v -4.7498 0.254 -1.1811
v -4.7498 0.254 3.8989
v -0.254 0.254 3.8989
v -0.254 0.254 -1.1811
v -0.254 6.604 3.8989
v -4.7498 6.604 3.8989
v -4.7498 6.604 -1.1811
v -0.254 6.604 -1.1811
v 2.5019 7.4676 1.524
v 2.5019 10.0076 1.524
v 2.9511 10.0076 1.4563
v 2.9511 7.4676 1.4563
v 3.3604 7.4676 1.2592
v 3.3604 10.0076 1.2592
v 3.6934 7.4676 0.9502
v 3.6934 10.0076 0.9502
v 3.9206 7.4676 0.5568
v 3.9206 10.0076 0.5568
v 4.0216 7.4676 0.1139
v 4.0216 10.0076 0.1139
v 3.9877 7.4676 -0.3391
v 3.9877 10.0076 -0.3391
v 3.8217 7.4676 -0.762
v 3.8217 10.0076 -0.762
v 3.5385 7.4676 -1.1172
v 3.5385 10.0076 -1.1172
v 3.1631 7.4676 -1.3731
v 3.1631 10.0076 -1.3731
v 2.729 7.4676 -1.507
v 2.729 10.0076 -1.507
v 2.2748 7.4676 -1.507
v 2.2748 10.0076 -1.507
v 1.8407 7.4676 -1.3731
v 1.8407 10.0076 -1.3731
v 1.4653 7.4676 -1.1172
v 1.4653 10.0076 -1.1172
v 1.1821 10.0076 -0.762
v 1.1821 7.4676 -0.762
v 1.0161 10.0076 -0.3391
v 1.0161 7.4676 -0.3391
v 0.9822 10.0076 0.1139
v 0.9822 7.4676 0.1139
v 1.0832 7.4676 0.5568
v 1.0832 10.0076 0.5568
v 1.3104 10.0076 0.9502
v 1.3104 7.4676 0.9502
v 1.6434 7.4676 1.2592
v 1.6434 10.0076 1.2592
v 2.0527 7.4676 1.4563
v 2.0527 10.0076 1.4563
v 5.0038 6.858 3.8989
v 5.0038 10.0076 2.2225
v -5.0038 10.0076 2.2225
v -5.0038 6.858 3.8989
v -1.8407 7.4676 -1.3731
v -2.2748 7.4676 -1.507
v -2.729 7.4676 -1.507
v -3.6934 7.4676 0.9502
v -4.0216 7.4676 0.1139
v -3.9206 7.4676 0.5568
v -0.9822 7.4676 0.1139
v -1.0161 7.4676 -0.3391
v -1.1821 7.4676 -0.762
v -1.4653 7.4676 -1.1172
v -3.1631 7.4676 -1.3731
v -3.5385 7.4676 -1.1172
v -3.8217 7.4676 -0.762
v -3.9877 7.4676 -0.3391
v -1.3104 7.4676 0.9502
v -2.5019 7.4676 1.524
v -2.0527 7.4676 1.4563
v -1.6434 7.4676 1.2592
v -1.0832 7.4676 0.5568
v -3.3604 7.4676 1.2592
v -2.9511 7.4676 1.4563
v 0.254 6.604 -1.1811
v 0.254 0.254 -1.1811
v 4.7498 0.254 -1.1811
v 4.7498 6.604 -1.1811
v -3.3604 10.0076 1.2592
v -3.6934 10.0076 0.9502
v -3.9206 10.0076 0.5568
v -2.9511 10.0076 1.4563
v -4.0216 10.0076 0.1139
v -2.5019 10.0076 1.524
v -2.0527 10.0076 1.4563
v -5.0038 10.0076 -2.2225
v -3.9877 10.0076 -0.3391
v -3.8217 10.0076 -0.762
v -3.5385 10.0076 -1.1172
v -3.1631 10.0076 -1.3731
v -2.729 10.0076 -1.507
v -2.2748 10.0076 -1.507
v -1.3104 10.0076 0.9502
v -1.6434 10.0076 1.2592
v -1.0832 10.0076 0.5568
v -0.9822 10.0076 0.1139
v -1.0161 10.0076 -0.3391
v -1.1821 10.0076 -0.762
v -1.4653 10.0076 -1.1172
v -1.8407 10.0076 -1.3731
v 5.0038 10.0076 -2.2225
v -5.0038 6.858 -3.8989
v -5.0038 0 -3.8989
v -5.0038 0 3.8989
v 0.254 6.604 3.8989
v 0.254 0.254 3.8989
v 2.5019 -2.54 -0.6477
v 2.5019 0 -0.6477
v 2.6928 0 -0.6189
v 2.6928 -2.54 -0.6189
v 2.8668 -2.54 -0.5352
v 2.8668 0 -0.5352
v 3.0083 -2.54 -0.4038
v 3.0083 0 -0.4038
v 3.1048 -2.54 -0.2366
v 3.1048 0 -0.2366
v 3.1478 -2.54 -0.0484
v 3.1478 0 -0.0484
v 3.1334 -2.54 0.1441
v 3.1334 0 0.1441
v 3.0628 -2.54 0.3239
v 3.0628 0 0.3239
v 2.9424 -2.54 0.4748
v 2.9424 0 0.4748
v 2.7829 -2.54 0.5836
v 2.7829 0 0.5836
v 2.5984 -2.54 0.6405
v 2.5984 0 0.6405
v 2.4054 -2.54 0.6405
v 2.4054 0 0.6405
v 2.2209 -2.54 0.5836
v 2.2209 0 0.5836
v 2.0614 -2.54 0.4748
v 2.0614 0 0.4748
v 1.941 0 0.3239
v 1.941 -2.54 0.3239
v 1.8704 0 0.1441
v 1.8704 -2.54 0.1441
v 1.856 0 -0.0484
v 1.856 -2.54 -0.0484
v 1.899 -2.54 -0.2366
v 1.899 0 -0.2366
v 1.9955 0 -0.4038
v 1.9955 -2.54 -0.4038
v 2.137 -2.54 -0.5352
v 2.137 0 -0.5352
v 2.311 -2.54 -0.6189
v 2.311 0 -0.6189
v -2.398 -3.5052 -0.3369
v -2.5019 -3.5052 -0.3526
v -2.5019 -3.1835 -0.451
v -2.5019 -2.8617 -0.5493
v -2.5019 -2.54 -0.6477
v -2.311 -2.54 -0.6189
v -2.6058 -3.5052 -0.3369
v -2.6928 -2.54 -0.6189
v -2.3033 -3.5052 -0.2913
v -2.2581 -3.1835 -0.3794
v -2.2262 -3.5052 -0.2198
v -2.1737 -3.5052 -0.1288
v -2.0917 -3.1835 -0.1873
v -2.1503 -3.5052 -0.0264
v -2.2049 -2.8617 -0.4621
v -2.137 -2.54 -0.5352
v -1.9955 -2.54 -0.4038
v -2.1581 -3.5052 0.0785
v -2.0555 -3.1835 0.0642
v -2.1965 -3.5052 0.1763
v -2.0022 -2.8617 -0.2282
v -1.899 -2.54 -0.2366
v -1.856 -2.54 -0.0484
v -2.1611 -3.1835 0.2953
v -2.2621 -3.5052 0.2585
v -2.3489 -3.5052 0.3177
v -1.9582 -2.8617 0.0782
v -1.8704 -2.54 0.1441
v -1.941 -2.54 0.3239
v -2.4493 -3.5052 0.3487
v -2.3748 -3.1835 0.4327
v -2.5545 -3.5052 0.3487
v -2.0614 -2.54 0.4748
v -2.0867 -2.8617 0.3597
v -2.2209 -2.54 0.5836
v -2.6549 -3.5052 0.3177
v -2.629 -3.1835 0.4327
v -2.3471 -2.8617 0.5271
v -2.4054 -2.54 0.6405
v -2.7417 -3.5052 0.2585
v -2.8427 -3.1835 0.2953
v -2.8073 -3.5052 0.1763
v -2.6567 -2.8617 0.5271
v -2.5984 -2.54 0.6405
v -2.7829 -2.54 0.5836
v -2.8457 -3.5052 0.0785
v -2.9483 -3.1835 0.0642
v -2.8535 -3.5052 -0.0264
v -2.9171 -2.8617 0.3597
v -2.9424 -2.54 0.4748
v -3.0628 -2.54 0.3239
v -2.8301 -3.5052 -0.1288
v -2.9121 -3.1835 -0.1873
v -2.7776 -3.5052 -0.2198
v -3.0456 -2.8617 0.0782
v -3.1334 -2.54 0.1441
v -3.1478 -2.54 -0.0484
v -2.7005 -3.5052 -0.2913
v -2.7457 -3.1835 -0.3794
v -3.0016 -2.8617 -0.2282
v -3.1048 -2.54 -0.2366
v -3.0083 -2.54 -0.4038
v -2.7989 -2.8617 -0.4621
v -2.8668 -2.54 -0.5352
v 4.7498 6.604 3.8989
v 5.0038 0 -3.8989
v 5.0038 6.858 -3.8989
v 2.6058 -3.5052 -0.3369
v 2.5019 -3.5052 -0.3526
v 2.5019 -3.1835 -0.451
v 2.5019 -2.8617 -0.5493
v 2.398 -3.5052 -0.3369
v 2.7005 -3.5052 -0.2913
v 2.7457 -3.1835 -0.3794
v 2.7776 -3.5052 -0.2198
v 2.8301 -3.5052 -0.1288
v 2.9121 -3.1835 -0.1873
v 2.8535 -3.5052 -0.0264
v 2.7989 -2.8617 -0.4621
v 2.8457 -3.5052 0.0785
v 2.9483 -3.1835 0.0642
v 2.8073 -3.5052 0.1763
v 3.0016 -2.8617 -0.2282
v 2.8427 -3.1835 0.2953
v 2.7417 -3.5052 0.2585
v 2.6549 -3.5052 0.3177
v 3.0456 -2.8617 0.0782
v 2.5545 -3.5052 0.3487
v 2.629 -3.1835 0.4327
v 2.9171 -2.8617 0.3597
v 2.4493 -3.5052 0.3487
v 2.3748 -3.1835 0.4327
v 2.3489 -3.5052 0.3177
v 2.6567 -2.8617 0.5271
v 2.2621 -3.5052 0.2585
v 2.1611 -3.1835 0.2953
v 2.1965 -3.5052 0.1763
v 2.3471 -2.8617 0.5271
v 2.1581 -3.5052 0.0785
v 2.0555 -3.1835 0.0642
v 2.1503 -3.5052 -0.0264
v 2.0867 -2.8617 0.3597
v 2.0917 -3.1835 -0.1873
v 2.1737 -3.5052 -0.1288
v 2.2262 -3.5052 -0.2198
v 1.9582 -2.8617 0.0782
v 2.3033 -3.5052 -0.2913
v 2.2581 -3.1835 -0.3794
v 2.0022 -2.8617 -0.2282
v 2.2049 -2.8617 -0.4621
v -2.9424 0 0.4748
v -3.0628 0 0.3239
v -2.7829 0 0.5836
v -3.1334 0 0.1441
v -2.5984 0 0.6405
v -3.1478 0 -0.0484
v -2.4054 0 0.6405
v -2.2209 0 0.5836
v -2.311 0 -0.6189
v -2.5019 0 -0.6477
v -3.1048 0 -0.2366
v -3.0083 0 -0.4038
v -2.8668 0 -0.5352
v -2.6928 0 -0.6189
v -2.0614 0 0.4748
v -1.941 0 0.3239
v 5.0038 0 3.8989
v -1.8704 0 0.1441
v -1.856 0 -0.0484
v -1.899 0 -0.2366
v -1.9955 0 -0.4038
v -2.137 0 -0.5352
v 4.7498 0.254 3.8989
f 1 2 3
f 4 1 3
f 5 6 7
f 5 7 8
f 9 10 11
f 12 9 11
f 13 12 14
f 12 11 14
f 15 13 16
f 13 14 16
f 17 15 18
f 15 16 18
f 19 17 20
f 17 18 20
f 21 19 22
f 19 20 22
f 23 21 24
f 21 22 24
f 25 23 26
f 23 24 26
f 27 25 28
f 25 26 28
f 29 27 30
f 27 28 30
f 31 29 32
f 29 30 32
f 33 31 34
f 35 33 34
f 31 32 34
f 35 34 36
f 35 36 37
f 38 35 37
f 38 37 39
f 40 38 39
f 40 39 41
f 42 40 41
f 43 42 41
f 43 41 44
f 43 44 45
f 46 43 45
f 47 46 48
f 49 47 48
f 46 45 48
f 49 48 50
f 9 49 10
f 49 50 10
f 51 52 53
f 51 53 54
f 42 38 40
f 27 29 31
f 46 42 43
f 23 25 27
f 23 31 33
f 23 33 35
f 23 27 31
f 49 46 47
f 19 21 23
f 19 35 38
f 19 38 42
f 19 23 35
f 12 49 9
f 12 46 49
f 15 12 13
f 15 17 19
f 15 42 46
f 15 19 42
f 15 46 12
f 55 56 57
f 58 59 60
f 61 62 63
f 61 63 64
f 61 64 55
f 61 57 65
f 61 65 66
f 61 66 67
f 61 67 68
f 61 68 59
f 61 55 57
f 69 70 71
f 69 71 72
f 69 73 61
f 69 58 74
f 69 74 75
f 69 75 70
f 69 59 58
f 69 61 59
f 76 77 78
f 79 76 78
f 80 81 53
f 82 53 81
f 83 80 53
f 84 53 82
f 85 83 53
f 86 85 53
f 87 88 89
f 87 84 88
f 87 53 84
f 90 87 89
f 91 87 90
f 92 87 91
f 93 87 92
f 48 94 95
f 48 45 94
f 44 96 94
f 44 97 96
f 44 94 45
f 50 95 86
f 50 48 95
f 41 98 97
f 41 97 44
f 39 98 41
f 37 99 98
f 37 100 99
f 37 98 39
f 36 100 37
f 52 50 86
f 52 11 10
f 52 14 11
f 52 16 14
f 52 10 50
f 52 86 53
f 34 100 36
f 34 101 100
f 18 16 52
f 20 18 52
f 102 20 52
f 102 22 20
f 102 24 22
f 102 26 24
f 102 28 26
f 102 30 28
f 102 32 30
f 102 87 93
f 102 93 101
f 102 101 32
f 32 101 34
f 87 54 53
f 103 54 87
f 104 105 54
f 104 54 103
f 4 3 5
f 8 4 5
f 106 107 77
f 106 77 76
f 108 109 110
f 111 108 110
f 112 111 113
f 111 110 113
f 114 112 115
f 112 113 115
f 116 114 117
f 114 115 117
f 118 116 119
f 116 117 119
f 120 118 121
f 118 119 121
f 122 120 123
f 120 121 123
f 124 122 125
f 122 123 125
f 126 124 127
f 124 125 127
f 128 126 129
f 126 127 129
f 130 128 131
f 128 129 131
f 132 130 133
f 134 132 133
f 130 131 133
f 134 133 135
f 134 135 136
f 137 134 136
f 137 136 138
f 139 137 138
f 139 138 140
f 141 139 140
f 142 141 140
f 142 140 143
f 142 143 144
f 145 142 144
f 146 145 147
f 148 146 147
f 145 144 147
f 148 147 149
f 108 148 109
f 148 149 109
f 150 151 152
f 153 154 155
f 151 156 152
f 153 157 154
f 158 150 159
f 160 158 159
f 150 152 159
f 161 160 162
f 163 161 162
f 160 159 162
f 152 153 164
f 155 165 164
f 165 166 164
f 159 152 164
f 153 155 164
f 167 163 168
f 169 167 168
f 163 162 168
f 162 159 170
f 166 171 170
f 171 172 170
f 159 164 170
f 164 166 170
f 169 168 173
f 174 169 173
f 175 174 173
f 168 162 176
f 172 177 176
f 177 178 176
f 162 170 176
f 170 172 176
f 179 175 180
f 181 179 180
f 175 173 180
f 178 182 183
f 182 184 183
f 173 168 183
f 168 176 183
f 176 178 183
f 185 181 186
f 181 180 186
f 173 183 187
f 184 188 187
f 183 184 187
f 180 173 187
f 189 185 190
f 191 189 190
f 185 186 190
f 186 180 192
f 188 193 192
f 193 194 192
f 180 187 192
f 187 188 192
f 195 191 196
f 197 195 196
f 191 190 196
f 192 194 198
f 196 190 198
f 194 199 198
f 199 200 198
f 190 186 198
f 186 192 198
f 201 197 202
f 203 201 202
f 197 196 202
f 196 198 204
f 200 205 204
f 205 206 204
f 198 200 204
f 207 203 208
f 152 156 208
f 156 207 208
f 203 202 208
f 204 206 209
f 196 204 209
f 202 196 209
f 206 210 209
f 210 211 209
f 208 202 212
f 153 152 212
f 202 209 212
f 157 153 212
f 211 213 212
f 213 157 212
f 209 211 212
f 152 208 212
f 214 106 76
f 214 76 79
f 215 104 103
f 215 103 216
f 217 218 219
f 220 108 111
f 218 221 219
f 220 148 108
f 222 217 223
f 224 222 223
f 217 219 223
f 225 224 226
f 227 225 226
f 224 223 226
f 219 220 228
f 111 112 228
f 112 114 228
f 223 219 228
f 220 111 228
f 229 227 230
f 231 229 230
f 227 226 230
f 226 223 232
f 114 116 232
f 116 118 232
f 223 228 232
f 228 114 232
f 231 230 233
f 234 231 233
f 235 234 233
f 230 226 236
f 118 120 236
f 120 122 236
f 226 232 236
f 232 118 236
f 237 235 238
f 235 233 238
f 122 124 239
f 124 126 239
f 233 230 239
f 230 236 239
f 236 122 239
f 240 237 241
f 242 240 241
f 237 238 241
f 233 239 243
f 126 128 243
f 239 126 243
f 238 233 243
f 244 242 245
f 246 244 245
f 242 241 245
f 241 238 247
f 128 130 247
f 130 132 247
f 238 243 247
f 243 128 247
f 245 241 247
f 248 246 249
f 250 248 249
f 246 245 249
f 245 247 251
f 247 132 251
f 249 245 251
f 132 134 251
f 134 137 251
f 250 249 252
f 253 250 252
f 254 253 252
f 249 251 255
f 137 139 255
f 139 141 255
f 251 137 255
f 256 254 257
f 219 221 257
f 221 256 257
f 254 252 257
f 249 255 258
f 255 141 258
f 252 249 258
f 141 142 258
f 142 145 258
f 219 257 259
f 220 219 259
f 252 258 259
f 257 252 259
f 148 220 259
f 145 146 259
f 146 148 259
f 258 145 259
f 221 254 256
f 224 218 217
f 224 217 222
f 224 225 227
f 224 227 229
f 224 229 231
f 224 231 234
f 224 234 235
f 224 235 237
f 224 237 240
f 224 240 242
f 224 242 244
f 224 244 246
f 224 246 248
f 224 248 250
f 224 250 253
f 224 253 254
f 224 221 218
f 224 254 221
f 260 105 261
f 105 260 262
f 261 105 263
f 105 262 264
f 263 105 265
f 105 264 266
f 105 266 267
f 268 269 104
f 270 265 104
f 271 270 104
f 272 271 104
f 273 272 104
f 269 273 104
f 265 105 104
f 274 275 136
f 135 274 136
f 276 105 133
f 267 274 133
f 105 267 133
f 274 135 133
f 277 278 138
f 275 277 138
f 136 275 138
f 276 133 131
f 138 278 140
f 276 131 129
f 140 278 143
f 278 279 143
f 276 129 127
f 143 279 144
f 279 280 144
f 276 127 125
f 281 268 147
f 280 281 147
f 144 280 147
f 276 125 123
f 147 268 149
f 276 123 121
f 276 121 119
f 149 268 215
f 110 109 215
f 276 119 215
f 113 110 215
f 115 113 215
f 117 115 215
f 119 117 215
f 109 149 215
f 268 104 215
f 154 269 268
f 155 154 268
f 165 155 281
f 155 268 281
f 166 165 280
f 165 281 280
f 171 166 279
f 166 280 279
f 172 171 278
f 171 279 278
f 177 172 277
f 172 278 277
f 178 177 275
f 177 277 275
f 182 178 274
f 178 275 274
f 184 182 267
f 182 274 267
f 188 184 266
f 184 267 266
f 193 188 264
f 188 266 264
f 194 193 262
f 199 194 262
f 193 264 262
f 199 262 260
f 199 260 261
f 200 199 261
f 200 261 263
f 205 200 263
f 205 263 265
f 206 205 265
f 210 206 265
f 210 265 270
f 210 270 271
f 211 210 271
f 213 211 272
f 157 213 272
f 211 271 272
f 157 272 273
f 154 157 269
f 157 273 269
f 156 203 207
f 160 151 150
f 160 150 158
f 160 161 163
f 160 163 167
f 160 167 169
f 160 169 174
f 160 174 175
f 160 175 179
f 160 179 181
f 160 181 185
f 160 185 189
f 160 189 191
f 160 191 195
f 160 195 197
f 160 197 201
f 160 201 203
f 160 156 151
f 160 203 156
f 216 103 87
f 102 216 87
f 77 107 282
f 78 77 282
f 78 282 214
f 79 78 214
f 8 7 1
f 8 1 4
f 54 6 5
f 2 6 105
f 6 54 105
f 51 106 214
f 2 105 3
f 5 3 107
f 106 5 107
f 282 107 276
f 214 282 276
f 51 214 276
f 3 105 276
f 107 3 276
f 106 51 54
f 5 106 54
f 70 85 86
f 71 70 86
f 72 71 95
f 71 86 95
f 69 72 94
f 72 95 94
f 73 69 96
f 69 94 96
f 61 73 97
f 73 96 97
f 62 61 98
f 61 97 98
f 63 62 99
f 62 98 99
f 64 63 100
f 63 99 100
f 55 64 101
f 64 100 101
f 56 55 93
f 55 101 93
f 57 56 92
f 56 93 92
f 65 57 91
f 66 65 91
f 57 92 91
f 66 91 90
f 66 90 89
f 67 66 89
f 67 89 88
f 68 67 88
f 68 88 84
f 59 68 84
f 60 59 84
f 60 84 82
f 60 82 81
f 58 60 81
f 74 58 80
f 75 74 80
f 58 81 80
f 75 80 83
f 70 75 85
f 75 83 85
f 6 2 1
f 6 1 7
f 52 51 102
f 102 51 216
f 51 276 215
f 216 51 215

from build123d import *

# Parameters (mm, degrees)
SKETCH3_W                     = 10.0076
SKETCH3_H                     = 7.7978
BOSS_EXTRUDE1_DEPTH           = 10.0076
CUT_EXTRUDE1_DEPTH            = 10.0076
SKETCH5_R                     = 1.524
CUT_EXTRUDE2_DEPTH            = 2.54
SKETCH6_W                     = 4.4958
SKETCH6_H                     = 6.35
CUT_EXTRUDE3_DEPTH            = 5.08
SKETCH8_R                     = 0.6477
BOSS_EXTRUDE2_DEPTH           = 2.54
SKETCH9_R                     = 0.6477
BOSS_EXTRUDE3_DEPTH           = 0.9652
BOSS_EXTRUDE3_DRAFT           = 17
BOSS_EXTRUDE3_PROFILE_2_DEPTH = 0.9652
BOSS_EXTRUDE3_PROFILE_2_DRAFT = 17


with BuildPart() as part:
    # Sketch3 → Boss-Extrude1 (new body)
    with BuildSketch(Plane(origin=(0, 0, 0), x_dir=(1, 0, 0), z_dir=(0, 1, 0))):
        Rectangle(SKETCH3_W, SKETCH3_H)
    extrude(amount=BOSS_EXTRUDE1_DEPTH)

    # Sketch4 → Cut-Extrude1 (cut)
    with BuildSketch(Plane.ZY.offset(5.0038)):
        Polygon((-3.8989, 10.0076), (-3.8989, 6.858), (-2.2225, 10.0076), align=None)
        Polygon((3.8989, 10.0076), (2.2225, 10.0076), (3.8989, 6.858), align=None)
    extrude(amount=-CUT_EXTRUDE1_DEPTH, mode=Mode.SUBTRACT)

    # Sketch5 → Cut-Extrude2 (cut)
    with BuildSketch(Plane(origin=(0, 10.0076, 0), x_dir=(1, 0, 0), z_dir=(0, 1, 0))):
        with Locations(Location((-2.5019, 0, 0), (0, 0, 270))):
            Circle(SKETCH5_R)
        with Locations(Location((2.5019, 0, 0), (0, 0, 270))):
            Circle(SKETCH5_R)
    extrude(amount=-CUT_EXTRUDE2_DEPTH, mode=Mode.SUBTRACT)

    # Sketch6 → Cut-Extrude3 (cut)
    with BuildSketch(Plane.XY.offset(3.8989)):
        with Locations((-2.5019, 3.429)):
            Rectangle(SKETCH6_W, SKETCH6_H)
        with Locations((2.5019, 3.429)):
            Rectangle(SKETCH6_W, SKETCH6_H)
    extrude(amount=-CUT_EXTRUDE3_DEPTH, mode=Mode.SUBTRACT)

    # Sketch8 → Boss-Extrude2 (add)
    with BuildSketch(Plane.XZ):
        with Locations(Location((-2.5019, 0, 0), (0, 0, 270))):
            Circle(SKETCH8_R)
        with Locations(Location((2.5019, 0, 0), (0, 0, 270))):
            Circle(SKETCH8_R)
    extrude(amount=BOSS_EXTRUDE2_DEPTH)


with BuildPart() as boss_extrude3_tool:
    # Sketch9 → Boss-Extrude3 (with draft: the straight prism first)
    with BuildSketch(Plane.XZ.offset(2.54)):
        with Locations(Location((2.5019, 0, 0), (0, 0, 270))):
            Circle(SKETCH9_R)
    extrude(amount=BOSS_EXTRUDE3_DEPTH)
    # Boss-Extrude3: the draft: its side faces are tilted about the plane it starts from
    boss_extrude3_sides = [boss_extrude3_tool.faces().sort_by_distance(p)[0] for p in [
        (2.5019, -3.0226, 0.6477),
    ]]
    draft(boss_extrude3_sides, Plane.XZ.offset(2.54), BOSS_EXTRUDE3_DRAFT)


with BuildPart() as part_1:
    add(part.part)

    # Boss-Extrude3: add boss_extrude3_tool
    add(boss_extrude3_tool.part)


with BuildPart() as boss_extrude3_profile_2_tool:
    # Sketch9 → Boss-Extrude3 profile 2 (with draft: the straight prism first)
    with BuildSketch(Plane.XZ.offset(2.54)):
        with Locations(Location((-2.5019, 0, 0), (0, 0, 270))):
            Circle(SKETCH9_R)
    extrude(amount=BOSS_EXTRUDE3_PROFILE_2_DEPTH)
    # Boss-Extrude3 profile 2: the draft: its side faces are tilted about the plane it starts from
    boss_extrude3_profile_2_sides = [boss_extrude3_profile_2_tool.faces().sort_by_distance(p)[0] for p in [
        (-2.5019, -3.0226, 0.6477),
    ]]
    draft(boss_extrude3_profile_2_sides, Plane.XZ.offset(2.54), BOSS_EXTRUDE3_PROFILE_2_DRAFT)


with BuildPart() as part_2:
    add(part_1.part)

    # Boss-Extrude3 profile 2: add boss_extrude3_profile_2_tool
    add(boss_extrude3_profile_2_tool.part)


solid = part_2.part
